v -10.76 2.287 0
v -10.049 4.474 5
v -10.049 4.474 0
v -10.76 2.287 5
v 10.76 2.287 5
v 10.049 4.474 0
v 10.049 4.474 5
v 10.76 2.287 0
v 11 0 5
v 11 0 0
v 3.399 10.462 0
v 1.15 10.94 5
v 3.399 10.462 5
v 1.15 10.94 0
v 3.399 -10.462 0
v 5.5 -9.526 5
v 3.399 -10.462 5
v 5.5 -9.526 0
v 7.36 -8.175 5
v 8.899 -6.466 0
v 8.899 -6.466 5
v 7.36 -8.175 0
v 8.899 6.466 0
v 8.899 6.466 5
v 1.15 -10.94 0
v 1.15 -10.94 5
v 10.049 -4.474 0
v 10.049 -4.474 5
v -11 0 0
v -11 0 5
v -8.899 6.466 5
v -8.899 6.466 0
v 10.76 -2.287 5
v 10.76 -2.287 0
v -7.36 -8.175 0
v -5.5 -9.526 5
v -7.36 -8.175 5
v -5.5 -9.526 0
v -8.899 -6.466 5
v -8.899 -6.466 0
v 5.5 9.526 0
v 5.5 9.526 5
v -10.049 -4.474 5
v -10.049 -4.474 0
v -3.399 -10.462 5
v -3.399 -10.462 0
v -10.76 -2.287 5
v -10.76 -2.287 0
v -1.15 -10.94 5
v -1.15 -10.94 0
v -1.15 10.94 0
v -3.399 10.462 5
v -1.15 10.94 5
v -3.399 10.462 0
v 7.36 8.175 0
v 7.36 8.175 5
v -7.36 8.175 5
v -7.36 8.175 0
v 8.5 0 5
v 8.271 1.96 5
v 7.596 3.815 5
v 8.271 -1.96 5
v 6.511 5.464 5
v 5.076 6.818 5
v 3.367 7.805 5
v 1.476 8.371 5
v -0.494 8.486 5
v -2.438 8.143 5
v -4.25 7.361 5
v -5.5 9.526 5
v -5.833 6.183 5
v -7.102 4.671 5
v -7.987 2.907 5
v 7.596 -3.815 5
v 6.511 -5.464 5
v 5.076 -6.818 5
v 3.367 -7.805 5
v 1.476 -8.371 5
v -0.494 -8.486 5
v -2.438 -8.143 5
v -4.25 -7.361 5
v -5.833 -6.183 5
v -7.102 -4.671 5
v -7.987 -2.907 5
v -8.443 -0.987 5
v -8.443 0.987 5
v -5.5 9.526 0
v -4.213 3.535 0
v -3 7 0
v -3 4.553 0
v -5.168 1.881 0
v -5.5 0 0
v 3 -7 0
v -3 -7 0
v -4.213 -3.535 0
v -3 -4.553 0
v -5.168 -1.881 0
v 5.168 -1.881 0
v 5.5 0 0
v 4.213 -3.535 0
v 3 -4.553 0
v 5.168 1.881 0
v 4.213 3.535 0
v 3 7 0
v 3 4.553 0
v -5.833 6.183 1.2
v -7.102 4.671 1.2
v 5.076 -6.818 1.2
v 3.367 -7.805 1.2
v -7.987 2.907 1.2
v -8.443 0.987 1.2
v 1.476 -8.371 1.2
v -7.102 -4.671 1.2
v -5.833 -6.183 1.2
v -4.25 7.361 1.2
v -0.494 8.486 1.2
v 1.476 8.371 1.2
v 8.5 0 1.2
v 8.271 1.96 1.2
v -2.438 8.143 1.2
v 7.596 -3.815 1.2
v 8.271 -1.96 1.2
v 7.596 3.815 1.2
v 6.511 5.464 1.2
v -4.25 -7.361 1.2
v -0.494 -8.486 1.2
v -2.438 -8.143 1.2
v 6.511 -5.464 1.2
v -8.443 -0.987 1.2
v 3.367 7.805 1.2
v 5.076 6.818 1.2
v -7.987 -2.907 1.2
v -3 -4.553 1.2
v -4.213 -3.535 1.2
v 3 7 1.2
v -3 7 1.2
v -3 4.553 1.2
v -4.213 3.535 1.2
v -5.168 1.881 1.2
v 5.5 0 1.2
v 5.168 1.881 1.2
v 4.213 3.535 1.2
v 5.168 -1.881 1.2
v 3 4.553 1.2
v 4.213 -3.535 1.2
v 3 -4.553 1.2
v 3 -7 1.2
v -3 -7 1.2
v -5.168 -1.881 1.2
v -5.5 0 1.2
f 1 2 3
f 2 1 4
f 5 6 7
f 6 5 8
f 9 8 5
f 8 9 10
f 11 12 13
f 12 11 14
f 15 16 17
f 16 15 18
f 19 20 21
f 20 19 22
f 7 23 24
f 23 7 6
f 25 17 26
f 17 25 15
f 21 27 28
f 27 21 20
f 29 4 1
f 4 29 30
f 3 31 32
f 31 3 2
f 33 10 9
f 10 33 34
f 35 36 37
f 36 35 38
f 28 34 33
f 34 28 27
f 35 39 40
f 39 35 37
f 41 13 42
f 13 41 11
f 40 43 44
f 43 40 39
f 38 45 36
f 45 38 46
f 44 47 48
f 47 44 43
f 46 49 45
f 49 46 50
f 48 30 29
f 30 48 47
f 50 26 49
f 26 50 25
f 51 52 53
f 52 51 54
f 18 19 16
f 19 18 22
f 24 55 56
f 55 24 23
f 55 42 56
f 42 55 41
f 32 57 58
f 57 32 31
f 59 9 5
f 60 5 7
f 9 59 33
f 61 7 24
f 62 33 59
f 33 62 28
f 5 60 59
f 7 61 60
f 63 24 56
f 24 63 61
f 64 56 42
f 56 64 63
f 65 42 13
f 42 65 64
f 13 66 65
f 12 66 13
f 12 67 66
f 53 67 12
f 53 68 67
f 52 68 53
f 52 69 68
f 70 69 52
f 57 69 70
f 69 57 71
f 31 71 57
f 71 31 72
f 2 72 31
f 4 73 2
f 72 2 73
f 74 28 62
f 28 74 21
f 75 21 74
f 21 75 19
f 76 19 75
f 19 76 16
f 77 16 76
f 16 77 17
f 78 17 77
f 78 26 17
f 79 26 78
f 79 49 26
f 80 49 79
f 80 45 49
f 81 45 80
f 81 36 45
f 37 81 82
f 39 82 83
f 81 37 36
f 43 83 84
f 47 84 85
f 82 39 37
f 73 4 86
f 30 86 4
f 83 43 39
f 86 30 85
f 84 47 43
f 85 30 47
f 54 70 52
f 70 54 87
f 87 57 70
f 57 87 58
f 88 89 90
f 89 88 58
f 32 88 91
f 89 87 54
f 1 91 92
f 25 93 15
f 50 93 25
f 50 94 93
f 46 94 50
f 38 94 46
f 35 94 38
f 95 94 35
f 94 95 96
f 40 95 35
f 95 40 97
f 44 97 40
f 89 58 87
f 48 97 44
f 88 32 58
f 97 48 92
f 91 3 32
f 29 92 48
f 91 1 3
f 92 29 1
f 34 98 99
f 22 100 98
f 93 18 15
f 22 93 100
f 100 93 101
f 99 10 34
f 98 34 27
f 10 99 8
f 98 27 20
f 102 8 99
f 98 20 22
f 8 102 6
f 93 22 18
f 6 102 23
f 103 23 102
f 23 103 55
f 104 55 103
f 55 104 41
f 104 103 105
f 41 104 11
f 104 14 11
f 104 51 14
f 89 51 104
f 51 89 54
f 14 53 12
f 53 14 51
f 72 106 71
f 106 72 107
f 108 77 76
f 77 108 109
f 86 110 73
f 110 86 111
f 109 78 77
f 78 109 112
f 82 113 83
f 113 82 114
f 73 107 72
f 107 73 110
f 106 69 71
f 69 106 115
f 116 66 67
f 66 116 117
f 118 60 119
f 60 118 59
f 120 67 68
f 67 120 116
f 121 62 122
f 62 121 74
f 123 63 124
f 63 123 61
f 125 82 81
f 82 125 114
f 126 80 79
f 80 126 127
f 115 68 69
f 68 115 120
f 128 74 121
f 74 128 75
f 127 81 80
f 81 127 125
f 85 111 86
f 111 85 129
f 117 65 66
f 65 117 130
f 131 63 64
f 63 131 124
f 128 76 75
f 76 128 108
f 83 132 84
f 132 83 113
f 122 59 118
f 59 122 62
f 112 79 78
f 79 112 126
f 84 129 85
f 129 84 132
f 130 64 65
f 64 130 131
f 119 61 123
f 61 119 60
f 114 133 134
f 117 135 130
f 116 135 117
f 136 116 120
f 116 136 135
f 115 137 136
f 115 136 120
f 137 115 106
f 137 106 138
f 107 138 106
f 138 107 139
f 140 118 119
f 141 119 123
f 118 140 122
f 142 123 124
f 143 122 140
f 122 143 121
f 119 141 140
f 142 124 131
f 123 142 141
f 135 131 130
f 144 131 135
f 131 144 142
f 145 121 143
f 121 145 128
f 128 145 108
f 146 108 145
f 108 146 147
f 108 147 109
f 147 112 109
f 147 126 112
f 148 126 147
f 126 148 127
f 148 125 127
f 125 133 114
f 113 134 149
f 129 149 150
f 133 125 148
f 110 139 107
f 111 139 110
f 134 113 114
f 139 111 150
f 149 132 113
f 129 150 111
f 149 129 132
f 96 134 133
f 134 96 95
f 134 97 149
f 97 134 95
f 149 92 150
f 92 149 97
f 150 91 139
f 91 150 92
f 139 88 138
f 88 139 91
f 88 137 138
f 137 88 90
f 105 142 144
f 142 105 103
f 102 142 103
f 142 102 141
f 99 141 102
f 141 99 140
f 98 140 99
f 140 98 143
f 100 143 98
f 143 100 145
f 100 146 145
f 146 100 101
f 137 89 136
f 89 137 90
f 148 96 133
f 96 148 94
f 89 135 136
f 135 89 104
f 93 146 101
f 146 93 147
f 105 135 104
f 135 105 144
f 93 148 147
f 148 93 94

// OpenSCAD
module connector_female(thickness=3, height=5, scale=1) {
    difference() {
        union() {
            difference() {
                linear_extrude(height, scale=scale) circle(16/2 + thickness);
                linear_extrude(height+0.1) circle(17/2);
            }
            
            linear_extrude(1.2) {
                difference() {
                    circle(16/2 + thickness);
                    circle(11/2);
                }
            }
        }

        linear_extrude(10, center=true)
        square([6,14], true);
    }
}

connector_female();
